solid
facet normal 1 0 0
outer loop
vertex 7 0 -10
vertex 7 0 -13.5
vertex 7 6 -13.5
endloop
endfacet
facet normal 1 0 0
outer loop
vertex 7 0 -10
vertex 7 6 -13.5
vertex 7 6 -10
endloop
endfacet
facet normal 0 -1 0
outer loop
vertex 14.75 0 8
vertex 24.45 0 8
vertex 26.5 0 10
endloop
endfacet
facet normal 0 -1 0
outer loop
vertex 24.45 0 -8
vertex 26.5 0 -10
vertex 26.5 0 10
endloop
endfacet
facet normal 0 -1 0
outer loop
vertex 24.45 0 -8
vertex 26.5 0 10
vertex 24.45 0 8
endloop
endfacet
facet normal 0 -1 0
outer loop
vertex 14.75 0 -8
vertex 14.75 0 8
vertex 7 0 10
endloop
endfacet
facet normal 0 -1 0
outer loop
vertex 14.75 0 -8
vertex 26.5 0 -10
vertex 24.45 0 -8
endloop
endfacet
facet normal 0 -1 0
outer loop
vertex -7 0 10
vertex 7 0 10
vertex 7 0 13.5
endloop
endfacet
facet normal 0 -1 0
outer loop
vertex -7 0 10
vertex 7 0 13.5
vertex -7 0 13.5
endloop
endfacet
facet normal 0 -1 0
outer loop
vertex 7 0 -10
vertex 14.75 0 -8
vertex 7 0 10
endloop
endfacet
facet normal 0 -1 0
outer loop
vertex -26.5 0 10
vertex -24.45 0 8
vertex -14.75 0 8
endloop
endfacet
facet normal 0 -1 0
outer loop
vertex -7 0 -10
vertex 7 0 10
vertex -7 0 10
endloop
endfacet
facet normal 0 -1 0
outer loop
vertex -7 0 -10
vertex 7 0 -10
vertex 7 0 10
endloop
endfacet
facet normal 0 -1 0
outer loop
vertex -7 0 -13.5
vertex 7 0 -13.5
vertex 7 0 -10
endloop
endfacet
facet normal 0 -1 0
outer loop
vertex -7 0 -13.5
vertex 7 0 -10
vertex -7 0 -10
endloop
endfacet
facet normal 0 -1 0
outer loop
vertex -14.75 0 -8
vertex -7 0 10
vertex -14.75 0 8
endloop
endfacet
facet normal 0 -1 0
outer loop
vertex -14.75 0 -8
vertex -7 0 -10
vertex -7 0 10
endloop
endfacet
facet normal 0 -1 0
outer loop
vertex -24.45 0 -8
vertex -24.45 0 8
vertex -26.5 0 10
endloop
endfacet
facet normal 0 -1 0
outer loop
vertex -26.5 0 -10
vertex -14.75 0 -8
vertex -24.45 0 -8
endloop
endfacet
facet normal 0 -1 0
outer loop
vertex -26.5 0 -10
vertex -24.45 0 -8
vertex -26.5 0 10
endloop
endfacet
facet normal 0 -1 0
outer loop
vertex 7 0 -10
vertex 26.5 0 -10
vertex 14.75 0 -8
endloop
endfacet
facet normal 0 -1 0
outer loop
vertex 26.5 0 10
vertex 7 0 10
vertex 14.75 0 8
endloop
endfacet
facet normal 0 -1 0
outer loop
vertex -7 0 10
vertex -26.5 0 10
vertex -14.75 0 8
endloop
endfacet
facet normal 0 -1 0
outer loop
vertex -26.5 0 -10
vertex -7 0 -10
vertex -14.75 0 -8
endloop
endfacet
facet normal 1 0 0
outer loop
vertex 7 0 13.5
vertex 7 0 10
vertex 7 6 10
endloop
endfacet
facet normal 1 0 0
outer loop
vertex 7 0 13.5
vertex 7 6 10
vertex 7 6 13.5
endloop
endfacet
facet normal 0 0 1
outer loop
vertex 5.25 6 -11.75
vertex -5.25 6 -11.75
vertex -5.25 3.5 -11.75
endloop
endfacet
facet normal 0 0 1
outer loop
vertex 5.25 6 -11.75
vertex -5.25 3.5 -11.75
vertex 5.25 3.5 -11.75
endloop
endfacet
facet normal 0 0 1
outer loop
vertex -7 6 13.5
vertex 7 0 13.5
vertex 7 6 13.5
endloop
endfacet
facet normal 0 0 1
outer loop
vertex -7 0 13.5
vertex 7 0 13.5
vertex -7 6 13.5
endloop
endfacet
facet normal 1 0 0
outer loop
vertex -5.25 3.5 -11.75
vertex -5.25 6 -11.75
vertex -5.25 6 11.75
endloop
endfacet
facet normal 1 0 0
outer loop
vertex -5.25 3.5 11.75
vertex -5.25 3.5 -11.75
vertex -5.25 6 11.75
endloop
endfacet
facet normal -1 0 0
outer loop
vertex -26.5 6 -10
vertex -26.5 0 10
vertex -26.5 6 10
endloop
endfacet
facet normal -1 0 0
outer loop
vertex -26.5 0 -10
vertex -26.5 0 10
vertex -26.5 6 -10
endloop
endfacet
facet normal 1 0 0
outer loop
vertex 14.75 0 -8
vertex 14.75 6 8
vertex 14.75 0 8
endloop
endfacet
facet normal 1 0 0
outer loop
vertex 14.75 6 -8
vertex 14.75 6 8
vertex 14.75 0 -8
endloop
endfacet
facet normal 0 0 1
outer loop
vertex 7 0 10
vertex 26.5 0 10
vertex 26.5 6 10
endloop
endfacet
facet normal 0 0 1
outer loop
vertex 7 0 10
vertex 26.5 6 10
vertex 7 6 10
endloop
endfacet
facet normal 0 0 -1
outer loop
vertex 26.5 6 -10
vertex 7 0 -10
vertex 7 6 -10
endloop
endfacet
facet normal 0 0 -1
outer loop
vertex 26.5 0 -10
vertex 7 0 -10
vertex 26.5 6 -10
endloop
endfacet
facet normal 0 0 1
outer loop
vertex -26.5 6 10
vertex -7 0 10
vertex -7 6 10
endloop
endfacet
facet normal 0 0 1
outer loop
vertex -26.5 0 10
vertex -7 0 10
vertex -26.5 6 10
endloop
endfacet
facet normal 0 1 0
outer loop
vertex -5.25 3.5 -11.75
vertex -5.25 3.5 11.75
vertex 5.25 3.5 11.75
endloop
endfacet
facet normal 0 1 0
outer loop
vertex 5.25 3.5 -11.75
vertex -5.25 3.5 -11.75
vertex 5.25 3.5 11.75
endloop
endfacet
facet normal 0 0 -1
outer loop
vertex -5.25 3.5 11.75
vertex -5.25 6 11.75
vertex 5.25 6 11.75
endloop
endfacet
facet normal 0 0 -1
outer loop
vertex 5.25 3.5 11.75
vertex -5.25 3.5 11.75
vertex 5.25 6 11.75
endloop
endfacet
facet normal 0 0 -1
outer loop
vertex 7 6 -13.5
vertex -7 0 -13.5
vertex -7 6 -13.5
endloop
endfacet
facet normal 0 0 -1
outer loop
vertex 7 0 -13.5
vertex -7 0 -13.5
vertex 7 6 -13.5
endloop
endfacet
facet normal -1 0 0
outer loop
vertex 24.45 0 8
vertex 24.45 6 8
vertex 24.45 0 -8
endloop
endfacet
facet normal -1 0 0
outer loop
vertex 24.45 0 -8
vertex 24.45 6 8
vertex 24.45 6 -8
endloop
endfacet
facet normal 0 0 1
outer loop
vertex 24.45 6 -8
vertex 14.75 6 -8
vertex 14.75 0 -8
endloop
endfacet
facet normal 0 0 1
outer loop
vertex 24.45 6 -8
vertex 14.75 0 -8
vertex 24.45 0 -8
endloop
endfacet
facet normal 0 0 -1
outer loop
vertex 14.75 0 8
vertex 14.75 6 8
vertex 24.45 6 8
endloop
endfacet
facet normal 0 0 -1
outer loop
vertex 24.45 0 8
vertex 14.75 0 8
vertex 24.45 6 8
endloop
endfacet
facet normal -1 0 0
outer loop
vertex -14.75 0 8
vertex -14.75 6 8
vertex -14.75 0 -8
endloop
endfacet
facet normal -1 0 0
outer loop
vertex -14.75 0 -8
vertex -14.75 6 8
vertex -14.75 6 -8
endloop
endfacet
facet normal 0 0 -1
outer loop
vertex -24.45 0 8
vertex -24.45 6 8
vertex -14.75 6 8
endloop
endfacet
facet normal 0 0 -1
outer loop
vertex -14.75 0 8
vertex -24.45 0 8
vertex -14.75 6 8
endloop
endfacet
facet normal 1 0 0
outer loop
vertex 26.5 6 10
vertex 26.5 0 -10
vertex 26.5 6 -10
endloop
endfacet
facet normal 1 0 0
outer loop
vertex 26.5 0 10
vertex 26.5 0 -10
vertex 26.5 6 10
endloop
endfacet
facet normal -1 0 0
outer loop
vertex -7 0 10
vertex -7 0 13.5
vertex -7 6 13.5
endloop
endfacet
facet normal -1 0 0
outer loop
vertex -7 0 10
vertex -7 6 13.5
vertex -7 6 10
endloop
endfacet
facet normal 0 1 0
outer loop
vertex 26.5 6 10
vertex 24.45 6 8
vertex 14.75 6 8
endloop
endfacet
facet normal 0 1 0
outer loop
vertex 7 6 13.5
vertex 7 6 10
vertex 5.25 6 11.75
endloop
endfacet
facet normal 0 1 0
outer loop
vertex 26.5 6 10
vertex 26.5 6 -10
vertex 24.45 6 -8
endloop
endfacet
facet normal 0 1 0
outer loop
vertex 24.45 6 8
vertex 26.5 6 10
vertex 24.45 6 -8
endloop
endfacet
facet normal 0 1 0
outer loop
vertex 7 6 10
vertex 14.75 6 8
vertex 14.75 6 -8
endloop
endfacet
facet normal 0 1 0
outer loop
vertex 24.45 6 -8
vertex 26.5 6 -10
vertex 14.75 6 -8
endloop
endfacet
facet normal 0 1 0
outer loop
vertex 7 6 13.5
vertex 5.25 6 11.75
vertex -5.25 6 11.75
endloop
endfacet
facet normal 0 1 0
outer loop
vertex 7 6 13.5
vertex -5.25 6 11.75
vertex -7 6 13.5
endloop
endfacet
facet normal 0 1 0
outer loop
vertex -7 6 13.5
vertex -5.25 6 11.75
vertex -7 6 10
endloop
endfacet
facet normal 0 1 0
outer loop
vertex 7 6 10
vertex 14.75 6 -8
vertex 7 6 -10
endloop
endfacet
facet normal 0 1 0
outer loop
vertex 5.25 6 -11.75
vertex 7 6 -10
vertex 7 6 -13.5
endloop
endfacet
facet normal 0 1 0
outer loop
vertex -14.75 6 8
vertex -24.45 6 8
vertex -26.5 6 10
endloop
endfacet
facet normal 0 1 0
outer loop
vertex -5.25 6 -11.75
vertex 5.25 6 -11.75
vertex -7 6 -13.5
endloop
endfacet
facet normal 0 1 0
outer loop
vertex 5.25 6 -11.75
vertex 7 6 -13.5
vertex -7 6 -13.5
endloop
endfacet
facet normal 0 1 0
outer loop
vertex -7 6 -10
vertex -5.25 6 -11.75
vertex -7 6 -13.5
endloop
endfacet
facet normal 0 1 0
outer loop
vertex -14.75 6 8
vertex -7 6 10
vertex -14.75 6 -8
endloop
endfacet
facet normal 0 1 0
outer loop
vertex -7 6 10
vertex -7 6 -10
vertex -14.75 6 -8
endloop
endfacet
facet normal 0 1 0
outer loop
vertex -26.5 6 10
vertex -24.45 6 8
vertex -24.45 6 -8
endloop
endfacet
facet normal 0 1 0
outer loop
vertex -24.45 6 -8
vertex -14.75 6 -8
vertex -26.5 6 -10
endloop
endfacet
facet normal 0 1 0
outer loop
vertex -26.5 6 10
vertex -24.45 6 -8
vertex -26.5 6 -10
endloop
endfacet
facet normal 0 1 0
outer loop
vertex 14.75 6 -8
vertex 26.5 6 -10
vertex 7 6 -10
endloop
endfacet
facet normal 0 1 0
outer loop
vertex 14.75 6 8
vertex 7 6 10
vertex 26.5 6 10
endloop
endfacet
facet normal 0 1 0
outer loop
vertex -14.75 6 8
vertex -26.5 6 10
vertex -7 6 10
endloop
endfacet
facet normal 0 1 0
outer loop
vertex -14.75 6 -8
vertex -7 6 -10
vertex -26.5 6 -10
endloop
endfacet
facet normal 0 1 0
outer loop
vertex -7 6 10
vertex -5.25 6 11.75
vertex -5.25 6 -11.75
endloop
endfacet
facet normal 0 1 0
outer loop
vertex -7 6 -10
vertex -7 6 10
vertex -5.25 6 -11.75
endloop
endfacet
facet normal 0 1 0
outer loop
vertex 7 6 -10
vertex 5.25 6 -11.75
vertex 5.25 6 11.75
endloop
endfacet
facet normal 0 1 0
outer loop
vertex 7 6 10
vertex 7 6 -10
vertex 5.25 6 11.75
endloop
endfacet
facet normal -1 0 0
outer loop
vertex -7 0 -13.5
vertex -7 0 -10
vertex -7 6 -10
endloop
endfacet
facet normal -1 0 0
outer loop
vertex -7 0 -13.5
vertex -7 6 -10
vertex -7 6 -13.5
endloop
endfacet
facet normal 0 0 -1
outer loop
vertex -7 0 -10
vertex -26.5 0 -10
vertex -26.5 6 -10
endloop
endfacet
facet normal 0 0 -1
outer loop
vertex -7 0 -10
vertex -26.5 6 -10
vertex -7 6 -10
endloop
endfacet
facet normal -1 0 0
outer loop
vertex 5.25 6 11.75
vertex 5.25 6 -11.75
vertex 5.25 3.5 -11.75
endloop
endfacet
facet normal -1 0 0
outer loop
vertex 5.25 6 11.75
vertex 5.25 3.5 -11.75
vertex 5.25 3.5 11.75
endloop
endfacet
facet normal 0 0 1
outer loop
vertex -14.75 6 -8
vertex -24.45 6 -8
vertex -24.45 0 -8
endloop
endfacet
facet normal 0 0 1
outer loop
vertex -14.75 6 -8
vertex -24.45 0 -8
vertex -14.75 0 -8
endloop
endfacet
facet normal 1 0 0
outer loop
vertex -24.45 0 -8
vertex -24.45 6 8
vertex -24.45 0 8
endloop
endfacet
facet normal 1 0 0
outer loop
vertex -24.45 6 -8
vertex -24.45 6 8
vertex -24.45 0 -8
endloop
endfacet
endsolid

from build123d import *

# Parameters (mm, degrees)
DODANIE_WYCI_GNI_CIE1_DEPTH = 6
WYTNIJ_WYCI_GNI_CIE1_REACH  = 32.34
SZKIC2_W                    = 9.7
SZKIC2_H                    = 16
SZKIC4_W                    = 10.5
SZKIC4_H                    = 23.5
WYTNIJ_WYCI_GNI_CIE3_DEPTH  = 2.5


with BuildPart() as part:
    # Szkic1 → Dodanie-wyciągnięcie1 (new body)
    with BuildSketch(Plane(origin=(0, 0, 0), x_dir=(1, 0, 0), z_dir=(0, 1, 0))):
        Polygon((-7, 10), (-7, 13.5), (7, 13.5), (7, 10), (26.5, 10), (26.5, -10), (7, -10), (7, -13.5), (-7, -13.5), (-7, -10), (-26.5, -10), (-26.5, 10), align=None)
    extrude(amount=DODANIE_WYCI_GNI_CIE1_DEPTH)

    # Szkic2 → Wytnij-wyciągnięcie1 (cut, up to next)
    with BuildSketch(Plane(origin=(0, 6, 0), x_dir=(1, 0, 0), z_dir=(0, 1, 0)), mode=Mode.PRIVATE) as wytnij_wyci_gni_cie1_sk1:
        with Locations((-19.6, 0)):
            Rectangle(SZKIC2_W, SZKIC2_H)
    wytnij_wyci_gni_cie1_tool1 = extrude(wytnij_wyci_gni_cie1_sk1.sketch, amount=-WYTNIJ_WYCI_GNI_CIE1_REACH, mode=Mode.PRIVATE) & part.part
    # Szkic2 → Wytnij-wyciągnięcie1 (cut, up to next)
    with BuildSketch(Plane(origin=(0, 6, 0), x_dir=(1, 0, 0), z_dir=(0, 1, 0)), mode=Mode.PRIVATE) as wytnij_wyci_gni_cie1_sk2:
        with Locations((19.6, 0)):
            Rectangle(SZKIC2_W, SZKIC2_H)
    wytnij_wyci_gni_cie1_tool2 = extrude(wytnij_wyci_gni_cie1_sk2.sketch, amount=-WYTNIJ_WYCI_GNI_CIE1_REACH, mode=Mode.PRIVATE) & part.part
    add(wytnij_wyci_gni_cie1_tool1.solids().sort_by_distance((-19.6, 6, 0))[0], mode=Mode.SUBTRACT)
    add(wytnij_wyci_gni_cie1_tool2.solids().sort_by_distance((19.6, 6, 0))[0], mode=Mode.SUBTRACT)

    # Szkic4 → Wytnij-wyciągnięcie3 (cut)
    with BuildSketch(Plane.XZ.offset(-6)):
        Rectangle(SZKIC4_W, SZKIC4_H)
    extrude(amount=WYTNIJ_WYCI_GNI_CIE3_DEPTH, mode=Mode.SUBTRACT)


solid = part.part
